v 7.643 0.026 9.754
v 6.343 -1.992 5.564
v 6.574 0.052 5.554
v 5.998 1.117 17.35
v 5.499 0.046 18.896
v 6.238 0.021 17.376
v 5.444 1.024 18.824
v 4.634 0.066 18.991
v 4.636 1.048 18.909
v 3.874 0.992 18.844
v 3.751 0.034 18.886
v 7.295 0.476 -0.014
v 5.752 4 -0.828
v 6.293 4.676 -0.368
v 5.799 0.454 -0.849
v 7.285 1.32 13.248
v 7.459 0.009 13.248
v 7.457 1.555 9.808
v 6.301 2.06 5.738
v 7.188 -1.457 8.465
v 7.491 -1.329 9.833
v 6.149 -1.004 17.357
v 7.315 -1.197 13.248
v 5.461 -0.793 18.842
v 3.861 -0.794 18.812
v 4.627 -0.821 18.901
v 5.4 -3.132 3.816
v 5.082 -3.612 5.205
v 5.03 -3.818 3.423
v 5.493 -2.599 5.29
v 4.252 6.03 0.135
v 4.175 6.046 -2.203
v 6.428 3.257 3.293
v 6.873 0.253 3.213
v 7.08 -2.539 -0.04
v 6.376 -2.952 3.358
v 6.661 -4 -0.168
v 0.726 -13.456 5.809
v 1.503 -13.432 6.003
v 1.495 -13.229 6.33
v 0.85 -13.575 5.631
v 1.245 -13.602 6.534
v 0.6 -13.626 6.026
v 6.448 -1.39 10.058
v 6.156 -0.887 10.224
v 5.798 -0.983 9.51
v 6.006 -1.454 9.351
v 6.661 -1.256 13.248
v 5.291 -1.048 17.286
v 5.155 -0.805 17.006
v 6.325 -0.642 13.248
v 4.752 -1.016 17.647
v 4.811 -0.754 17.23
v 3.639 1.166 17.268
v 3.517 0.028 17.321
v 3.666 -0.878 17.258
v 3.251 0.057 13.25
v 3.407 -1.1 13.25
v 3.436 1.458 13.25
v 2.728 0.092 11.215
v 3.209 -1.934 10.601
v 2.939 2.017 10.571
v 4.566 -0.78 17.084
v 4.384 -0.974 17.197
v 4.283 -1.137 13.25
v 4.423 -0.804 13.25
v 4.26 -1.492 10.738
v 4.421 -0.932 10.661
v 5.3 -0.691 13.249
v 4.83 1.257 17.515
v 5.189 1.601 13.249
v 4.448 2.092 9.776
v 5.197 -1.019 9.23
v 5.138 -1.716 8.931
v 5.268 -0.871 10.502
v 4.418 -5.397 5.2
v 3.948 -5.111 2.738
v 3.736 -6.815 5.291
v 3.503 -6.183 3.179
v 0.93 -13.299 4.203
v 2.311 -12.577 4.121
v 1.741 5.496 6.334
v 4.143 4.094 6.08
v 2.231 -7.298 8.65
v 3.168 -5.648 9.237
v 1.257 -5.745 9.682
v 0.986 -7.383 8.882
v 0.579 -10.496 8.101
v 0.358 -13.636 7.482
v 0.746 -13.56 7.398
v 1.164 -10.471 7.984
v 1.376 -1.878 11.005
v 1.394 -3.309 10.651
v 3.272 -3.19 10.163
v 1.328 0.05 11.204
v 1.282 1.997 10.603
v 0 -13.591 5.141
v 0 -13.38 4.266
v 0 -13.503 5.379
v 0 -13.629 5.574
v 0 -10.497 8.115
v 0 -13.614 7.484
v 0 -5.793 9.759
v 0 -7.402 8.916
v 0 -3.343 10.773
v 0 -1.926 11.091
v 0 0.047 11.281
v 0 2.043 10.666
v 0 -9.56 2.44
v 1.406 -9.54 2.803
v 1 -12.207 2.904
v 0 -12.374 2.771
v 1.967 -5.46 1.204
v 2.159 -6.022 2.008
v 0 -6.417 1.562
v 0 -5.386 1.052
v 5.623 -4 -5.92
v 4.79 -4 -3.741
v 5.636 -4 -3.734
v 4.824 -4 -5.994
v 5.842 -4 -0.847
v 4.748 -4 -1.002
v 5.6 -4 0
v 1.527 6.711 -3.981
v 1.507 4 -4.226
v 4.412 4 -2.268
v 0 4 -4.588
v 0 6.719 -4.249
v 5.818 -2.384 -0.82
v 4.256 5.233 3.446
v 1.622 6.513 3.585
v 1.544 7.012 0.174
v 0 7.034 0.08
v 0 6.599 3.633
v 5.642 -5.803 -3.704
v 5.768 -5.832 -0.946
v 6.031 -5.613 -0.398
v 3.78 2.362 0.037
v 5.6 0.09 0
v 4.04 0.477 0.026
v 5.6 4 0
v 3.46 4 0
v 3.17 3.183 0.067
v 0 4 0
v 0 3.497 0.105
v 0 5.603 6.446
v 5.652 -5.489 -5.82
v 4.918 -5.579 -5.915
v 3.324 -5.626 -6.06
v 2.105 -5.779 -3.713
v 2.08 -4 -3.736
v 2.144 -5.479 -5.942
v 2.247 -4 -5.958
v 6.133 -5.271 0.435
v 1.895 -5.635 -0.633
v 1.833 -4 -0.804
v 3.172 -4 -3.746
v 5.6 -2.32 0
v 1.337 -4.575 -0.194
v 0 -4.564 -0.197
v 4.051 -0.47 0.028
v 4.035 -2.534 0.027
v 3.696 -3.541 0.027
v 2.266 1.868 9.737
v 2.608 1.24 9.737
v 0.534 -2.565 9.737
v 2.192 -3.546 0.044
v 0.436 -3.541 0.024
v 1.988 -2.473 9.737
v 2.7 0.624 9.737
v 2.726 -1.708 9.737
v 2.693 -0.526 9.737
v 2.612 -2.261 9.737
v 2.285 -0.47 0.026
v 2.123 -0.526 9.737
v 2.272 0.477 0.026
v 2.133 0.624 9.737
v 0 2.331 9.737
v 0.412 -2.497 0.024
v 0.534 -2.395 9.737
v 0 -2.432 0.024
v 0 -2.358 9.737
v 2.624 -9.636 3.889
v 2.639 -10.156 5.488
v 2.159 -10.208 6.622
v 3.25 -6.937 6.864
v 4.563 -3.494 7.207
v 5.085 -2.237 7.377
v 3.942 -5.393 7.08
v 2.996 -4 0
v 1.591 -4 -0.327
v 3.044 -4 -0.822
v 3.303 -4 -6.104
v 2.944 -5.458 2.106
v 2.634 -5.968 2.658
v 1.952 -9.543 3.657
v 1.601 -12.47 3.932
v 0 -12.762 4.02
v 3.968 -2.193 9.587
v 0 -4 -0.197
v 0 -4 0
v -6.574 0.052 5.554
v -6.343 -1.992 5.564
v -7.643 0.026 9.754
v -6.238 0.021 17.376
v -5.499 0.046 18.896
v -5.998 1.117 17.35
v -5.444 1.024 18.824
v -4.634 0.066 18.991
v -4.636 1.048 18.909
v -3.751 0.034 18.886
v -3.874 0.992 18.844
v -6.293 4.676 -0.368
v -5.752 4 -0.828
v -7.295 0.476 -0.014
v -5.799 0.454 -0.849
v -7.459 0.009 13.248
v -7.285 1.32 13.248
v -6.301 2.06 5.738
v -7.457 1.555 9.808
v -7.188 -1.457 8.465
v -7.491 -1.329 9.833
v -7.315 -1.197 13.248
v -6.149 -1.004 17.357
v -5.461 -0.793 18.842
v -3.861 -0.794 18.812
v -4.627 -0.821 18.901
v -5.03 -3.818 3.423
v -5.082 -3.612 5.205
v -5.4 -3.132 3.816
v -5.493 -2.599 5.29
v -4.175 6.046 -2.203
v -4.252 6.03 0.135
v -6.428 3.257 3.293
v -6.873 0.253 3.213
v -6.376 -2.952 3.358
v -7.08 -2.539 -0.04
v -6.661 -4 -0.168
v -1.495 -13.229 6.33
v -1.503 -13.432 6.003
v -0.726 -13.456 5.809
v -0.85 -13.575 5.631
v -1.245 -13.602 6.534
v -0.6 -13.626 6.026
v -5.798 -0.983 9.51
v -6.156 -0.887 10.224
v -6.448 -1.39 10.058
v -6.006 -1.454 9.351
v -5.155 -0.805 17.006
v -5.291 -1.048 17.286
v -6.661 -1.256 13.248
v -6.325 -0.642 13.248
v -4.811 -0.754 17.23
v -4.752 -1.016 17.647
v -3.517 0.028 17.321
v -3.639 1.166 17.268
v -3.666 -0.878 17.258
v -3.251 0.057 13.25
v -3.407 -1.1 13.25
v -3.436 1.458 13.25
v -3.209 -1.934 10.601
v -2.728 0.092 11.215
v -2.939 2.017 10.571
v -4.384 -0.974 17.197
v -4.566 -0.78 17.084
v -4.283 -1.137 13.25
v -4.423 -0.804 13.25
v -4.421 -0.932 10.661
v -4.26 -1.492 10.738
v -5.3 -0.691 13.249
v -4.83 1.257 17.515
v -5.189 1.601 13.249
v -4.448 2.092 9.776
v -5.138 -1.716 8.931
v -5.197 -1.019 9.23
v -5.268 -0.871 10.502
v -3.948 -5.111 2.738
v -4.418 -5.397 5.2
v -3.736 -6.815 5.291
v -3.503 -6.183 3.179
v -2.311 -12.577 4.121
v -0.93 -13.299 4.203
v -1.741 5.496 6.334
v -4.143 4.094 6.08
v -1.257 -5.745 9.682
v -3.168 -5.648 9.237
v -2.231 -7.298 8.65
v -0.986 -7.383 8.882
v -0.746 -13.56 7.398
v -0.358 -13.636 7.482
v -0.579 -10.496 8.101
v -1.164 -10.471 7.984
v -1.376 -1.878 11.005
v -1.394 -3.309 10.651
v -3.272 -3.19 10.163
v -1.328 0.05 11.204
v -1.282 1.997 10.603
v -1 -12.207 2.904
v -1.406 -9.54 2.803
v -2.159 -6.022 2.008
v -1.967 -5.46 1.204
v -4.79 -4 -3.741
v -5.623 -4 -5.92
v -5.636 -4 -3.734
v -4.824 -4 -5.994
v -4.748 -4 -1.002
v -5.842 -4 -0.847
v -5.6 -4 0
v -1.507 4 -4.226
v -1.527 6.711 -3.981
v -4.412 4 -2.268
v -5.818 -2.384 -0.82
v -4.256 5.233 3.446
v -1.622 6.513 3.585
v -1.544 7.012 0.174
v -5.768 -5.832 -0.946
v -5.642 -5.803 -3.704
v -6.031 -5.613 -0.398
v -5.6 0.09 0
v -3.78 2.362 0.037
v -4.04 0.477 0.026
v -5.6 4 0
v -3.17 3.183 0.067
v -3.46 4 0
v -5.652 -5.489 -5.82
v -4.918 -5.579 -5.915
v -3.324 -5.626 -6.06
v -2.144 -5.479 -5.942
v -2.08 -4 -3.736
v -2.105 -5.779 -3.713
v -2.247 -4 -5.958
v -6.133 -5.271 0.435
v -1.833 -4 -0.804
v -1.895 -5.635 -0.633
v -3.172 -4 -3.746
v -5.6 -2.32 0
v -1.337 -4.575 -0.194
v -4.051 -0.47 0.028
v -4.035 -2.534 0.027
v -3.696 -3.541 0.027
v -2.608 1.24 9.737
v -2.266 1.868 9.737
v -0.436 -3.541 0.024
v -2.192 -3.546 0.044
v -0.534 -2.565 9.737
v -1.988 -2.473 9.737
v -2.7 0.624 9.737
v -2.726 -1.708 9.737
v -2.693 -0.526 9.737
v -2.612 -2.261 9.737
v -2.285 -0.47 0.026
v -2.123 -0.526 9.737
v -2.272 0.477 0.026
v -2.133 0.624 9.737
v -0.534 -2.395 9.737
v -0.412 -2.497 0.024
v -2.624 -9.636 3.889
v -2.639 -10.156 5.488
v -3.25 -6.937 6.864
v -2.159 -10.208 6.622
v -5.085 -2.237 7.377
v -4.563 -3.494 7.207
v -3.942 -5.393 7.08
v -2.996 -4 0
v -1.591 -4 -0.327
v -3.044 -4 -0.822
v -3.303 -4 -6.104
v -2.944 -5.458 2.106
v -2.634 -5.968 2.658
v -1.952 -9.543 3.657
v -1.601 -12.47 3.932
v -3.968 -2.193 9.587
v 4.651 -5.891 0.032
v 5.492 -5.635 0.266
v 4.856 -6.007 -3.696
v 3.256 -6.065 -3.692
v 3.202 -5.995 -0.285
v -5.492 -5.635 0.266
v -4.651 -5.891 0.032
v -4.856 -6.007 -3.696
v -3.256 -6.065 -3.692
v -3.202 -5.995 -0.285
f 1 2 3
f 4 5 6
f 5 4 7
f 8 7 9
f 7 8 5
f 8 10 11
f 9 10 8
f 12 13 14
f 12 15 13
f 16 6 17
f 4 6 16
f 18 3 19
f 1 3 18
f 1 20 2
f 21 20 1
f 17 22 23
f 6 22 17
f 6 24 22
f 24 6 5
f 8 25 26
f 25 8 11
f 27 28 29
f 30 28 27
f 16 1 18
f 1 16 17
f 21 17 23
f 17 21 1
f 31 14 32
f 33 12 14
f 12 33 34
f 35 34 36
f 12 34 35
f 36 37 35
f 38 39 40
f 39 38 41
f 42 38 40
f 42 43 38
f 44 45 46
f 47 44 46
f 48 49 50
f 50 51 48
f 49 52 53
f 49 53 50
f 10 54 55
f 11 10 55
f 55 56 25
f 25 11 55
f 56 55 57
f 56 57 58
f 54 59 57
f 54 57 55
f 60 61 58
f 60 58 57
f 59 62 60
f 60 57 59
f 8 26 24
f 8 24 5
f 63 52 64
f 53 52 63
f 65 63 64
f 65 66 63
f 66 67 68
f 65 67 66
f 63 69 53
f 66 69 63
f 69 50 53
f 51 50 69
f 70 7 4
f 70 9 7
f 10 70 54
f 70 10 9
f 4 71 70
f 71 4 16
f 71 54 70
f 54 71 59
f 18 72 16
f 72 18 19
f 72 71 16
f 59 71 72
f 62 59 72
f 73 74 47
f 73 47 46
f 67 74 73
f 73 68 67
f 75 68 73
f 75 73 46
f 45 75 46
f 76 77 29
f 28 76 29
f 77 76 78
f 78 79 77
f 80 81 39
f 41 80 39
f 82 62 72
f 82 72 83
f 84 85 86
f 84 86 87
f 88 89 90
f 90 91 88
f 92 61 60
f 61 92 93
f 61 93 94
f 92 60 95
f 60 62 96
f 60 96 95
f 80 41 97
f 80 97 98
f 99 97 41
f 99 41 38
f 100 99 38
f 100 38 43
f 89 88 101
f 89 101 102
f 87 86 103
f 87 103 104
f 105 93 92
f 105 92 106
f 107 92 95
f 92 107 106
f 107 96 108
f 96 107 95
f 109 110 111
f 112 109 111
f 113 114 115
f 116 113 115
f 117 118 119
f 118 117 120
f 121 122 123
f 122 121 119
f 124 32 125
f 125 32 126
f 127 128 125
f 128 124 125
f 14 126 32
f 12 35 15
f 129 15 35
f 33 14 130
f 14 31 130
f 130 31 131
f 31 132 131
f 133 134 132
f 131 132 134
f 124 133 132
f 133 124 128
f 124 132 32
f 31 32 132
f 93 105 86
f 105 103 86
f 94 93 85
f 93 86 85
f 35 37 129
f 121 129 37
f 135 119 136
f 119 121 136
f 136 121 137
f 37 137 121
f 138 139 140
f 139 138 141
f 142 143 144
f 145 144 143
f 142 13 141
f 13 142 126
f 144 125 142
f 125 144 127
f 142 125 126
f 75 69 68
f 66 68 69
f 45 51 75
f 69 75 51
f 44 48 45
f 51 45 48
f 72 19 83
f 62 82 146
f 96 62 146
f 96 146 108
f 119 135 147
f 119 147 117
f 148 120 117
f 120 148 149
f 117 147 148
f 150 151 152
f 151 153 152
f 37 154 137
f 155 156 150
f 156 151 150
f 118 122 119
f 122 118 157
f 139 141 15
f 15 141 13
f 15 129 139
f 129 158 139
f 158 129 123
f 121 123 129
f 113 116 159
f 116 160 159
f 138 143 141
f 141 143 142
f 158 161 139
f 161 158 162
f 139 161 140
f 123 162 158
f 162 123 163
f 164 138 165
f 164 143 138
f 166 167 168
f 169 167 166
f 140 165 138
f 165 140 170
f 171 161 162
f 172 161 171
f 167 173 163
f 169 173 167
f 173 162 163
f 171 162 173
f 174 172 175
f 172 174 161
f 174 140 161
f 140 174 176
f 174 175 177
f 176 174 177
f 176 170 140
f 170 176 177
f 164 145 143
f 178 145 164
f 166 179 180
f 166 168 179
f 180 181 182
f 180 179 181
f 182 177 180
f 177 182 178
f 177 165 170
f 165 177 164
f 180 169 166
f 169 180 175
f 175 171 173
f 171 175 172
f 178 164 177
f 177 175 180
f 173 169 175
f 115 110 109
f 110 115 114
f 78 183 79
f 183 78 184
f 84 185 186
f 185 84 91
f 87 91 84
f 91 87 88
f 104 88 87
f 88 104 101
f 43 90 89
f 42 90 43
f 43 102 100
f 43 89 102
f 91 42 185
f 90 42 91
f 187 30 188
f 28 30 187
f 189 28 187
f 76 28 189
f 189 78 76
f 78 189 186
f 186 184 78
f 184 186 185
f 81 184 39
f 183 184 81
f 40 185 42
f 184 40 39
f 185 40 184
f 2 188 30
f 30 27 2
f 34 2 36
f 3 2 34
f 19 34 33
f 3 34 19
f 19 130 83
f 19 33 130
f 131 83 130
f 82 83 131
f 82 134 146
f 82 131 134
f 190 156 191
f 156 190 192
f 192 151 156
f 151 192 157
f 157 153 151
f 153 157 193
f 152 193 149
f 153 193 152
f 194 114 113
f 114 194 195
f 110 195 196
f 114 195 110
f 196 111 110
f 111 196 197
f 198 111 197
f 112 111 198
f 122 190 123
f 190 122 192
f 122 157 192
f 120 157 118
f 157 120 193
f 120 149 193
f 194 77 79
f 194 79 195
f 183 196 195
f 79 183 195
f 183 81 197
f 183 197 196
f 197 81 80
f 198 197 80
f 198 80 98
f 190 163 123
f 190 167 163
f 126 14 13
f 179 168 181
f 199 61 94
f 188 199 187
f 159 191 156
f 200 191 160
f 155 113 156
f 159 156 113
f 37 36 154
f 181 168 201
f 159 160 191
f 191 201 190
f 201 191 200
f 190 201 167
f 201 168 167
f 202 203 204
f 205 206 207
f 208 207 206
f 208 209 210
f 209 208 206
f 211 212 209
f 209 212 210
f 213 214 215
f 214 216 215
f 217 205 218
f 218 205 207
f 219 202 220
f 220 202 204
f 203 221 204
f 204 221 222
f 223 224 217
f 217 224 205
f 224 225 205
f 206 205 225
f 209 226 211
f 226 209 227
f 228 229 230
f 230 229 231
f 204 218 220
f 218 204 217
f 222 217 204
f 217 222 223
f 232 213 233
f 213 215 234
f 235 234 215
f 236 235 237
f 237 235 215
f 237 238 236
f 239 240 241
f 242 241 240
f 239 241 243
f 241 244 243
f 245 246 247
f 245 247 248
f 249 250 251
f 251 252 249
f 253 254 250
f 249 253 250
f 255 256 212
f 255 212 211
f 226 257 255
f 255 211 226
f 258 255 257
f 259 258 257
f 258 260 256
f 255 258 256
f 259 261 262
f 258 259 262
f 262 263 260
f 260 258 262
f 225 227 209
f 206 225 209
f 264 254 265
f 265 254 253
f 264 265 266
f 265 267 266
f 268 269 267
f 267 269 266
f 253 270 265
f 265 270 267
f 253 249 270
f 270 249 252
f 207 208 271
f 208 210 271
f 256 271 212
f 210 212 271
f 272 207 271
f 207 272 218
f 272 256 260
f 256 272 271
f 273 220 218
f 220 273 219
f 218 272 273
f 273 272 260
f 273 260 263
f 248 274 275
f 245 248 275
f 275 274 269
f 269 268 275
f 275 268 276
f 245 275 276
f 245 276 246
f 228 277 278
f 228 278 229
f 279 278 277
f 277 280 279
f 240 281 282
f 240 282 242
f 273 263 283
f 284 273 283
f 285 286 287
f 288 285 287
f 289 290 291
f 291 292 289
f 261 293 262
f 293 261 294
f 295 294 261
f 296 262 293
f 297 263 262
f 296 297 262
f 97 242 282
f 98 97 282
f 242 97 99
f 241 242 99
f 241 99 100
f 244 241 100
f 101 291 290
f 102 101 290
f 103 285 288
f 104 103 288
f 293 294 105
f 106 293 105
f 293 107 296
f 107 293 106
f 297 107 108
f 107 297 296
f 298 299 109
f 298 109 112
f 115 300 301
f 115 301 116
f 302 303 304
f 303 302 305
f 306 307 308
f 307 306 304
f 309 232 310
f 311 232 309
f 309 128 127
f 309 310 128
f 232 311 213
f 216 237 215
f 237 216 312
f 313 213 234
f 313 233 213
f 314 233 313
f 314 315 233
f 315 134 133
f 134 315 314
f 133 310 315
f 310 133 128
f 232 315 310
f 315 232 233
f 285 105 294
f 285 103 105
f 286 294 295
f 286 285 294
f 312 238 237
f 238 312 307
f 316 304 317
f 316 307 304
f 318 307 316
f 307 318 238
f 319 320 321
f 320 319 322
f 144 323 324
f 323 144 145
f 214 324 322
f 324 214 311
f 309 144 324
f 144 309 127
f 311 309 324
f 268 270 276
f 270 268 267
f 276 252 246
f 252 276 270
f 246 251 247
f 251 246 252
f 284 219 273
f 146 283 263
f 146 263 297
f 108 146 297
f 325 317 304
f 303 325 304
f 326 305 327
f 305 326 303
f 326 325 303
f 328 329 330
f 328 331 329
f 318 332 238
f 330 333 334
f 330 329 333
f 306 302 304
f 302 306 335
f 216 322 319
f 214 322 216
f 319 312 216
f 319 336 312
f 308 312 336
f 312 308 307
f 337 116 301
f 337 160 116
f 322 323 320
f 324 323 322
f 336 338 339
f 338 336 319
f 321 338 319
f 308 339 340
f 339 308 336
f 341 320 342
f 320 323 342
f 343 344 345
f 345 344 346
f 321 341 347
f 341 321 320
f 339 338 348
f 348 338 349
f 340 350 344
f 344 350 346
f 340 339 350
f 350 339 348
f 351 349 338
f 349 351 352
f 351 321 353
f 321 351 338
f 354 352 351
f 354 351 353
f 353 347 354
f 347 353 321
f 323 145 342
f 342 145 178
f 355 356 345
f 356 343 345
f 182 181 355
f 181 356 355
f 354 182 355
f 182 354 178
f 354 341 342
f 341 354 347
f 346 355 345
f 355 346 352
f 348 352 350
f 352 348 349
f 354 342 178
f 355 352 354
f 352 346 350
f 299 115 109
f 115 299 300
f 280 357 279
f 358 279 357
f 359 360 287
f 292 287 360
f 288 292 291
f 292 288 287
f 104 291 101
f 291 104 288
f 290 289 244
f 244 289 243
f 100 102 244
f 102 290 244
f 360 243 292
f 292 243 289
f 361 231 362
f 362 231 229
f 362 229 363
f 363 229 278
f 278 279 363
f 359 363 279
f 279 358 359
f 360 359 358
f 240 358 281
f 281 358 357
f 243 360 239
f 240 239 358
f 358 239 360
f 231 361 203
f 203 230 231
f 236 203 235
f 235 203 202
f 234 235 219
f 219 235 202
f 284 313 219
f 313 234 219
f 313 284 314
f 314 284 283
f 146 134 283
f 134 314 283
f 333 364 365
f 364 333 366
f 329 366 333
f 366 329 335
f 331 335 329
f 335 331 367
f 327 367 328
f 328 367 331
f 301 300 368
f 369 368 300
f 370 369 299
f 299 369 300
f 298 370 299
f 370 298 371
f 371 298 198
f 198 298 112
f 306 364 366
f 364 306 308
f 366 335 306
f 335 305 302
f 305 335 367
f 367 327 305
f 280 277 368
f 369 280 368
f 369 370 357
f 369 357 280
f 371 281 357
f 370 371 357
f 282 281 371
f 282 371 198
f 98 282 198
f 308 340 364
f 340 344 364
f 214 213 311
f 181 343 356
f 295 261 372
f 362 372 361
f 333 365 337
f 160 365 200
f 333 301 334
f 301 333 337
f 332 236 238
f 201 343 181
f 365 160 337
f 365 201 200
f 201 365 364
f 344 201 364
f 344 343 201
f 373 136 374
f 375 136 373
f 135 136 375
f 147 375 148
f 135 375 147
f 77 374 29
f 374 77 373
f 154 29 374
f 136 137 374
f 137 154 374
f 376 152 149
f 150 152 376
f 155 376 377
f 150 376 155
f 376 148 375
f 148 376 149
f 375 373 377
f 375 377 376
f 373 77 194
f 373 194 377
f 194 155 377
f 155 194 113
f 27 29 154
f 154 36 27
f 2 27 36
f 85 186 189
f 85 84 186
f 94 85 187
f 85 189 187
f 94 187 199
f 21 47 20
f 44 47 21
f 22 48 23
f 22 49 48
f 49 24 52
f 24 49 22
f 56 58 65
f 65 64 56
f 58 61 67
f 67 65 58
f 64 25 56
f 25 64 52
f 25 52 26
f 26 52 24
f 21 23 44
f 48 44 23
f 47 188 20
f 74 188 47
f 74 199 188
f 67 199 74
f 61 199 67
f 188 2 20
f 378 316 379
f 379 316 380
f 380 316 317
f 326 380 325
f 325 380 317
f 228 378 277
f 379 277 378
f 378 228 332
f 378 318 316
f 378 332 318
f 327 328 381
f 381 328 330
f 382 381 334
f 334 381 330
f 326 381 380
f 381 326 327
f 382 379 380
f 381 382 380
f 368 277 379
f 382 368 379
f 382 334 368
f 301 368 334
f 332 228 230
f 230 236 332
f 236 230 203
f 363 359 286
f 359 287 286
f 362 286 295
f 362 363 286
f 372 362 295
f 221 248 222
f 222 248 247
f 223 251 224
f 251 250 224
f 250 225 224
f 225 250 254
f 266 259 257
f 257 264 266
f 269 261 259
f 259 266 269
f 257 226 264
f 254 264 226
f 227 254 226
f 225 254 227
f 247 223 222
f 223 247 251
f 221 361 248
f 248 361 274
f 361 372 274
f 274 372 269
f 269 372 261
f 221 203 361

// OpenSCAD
use <../lib.scad>
use <s/93248s01.scad>
use <s/93248s02.scad>
function ldraw_lib__93248() = [
// 0 Minifig Headdress Anubis Guard
// 0 Name: 93248.dat
// 0 Author: Stan Isachenko [angmarec]
// 0 !LDRAW_ORG Part UPDATE 2012-03
// 0 !LICENSE Licensed under CC BY 2.0 and CC BY 4.0 : see CAreadme.txt
// 
// 0 BFC CERTIFY CCW
  [0,"BFC","CERTIFY"],
  [0,"BFC","CCW"],
// 
// 0 !CATEGORY Minifig Headwear
// 0 !KEYWORDS Pharaoh's Quest
// 
// 0 !HISTORY 2011-10-16 {LEGO Digital Designer} Original part shape
// 0 !HISTORY 2011-10-17 [angmarec] File preparation for LDraw Parts Tracker
// 0 !HISTORY 2011-12-04 [MagFors] Subfiled for patterned parts
// 0 !HISTORY 2012-03-30 [PTadmin] Official Update 2012-01
// 0 !HISTORY 2012-12-24 [cwdee] Update category
// 0 !HISTORY 2012-12-28 [PTadmin] Official Update 2012-03
// 
// 
// 1 16 0 0 0 1 0 0 0 1 0 0 0 1 s\93248s01.dat
  [1,16,0,0,0,1,0,0,0,1,0,0,0,1, ldraw_lib__s__93248s01()],
// 1 16 0 0 0 -1 0 0 0 1 0 0 0 1 s\93248s01.dat
  [1,16,0,0,0,-1,0,0,0,1,0,0,0,1, ldraw_lib__s__93248s01()],
// 1 16 0 0 0 1 0 0 0 1 0 0 0 1 s\93248s02.dat
  [1,16,0,0,0,1,0,0,0,1,0,0,0,1, ldraw_lib__s__93248s02()],
// 1 16 0 0 0 -1 0 0 0 1 0 0 0 1 s\93248s02.dat
  [1,16,0,0,0,-1,0,0,0,1,0,0,0,1, ldraw_lib__s__93248s02()],
// 0 //
// 5 24 0 10.622 16.798 0 -0.199 17.586 3.817 9.953 16.778 -3.817 9.953 16.778
  [5,24,0,10.622,16.798,0,-0.199,17.586,3.817,9.953,16.778,-3.817,9.953,16.778],
// 5 24 0 11.469 10 0 10.622 16.798 3.767 10.565 10 -3.767 10.565 10
  [5,24,0,11.469,10,0,10.622,16.798,3.767,10.565,10,-3.767,10.565,10],
// 5 24 0 -10.666 -33.451 0 -10.049 -31.904 2.325 -10.508 -33.247 -2.325 -10.508 -33.247
  [5,24,0,-10.666,-33.451,0,-10.049,-31.904,2.325,-10.508,-33.247,-2.325,-10.508,-33.247],
// 5 24 0 -24.342 5.827 0 -0.263 8.742 5.664 -24.342 4.671 -5.664 -24.342 4.671
  [5,24,0,-24.342,5.827,0,-0.263,8.742,5.664,-24.342,4.671,-5.664,-24.342,4.671],
// 5 24 0 -20.288 -26.242 0 -18.711 -34.034 0.895 -18.705 -34.089 -0.895 -18.705 -34.089
  [5,24,0,-20.288,-26.242,0,-18.711,-34.034,0.895,-18.705,-34.089,-0.895,-18.705,-34.089],
// 5 24 0 -18.711 -34.034 0 -13.936 -34.072 1.5 -15.066 -34.066 -1.5 -15.066 -34.066
  [5,24,0,-18.711,-34.034,0,-13.936,-34.072,1.5,-15.066,-34.066,-1.5,-15.066,-34.066],
// 5 24 0 -13.936 -34.072 0 -13.447 -33.757 1.816 -14.523 -33.639 -1.816 -14.523 -33.639
  [5,24,0,-13.936,-34.072,0,-13.447,-33.757,1.816,-14.523,-33.639,-1.816,-14.523,-33.639],
// 5 24 0 -0.061 -6.079 0 -24.342 -5.894 1.334 -24.342 -5.988 -1.334 -24.342 -5.988
  [5,24,0,-0.061,-6.079,0,-24.342,-5.894,1.334,-24.342,-5.988,-1.334,-24.342,-5.988],
// 5 24 0 -16.114 14.008 0 -26.666 5.108 3.206 -26.507 4.993 -3.206 -26.507 4.993
  [5,24,0,-16.114,14.008,0,-26.666,5.108,3.206,-26.507,4.993,-3.206,-26.507,4.993],
// 5 24 0 -12.853 -33.977 0 -10.666 -33.451 2.325 -10.508 -33.247 -2.325 -10.508 -33.247
  [5,24,0,-12.853,-33.977,0,-10.666,-33.451,2.325,-10.508,-33.247,-2.325,-10.508,-33.247],
// 5 24 0 -13.447 -33.757 0 -12.853 -33.977 2.124 -14.078 -33.938 -2.124 -14.078 -33.938
  [5,24,0,-13.447,-33.757,0,-12.853,-33.977,2.124,-14.078,-33.938,-2.124,-14.078,-33.938],
// 5 24 0 -24.342 -5.894 0 -24.342 5.827 1.334 -24.342 -5.988 -1.334 -24.342 -5.988
  [5,24,0,-24.342,-5.894,0,-24.342,5.827,1.334,-24.342,-5.988,-1.334,-24.342,-5.988],
// 5 24 0 -3.904 -16.042 0 -2.629 -13.466 4.918 -3.009 -13.651 -4.918 -3.009 -13.651
  [5,24,0,-3.904,-16.042,0,-2.629,-13.466,4.918,-3.009,-13.651,-4.918,-3.009,-13.651],
// 5 24 0 0.492 -11.411 0 0.492 -10 3.978 0.817 -10 -3.978 0.817 -10
  [5,24,0,0.492,-11.411,0,0.492,-10,3.978,0.817,-10,-3.978,0.817,-10],
// 5 24 0 -26.666 5.108 0 -28.203 0.117 3.206 -26.507 4.993 -3.206 -26.507 4.993
  [5,24,0,-26.666,5.108,0,-28.203,0.117,3.206,-26.507,4.993,-3.206,-26.507,4.993],
// 5 24 0 -6.928 -30.935 0 -6.1 -23.899 2.501 -7.261 -30.517 -2.501 -7.261 -30.517
  [5,24,0,-6.928,-30.935,0,-6.1,-23.899,2.501,-7.261,-30.517,-2.501,-7.261,-30.517],
// 5 24 0 -28.203 0.117 0 -27.727 -4.816 3.319 -28.01 0.124 -3.319 -28.01 0.124
  [5,24,0,-28.203,0.117,0,-27.727,-4.816,3.319,-28.01,0.124,-3.319,-28.01,0.124],
// 5 24 0 -9.083 16.497 0 -16.114 14.008 4.353 -15.835 13.739 -4.353 -15.835 13.739
  [5,24,0,-9.083,16.497,0,-16.114,14.008,4.353,-15.835,13.739,-4.353,-15.835,13.739],
// 5 24 0 0 10 0 11.469 10 3.767 10.565 10 -3.767 10.565 10
  [5,24,0,0,10,0,11.469,10,3.767,10.565,10,-3.767,10.565,10],
// 5 24 0 -26.932 -8.358 0 -24.398 -14.482 3.143 -24.205 -14.363 -3.143 -24.205 -14.363
  [5,24,0,-26.932,-8.358,0,-24.398,-14.482,3.143,-24.205,-14.363,-3.143,-24.205,-14.363],
// 5 24 0 -0.199 17.586 0 -9.083 16.497 3.86 -0.435 17.529 -3.86 -0.435 17.529
  [5,24,0,-0.199,17.586,0,-9.083,16.497,3.86,-0.435,17.529,-3.86,-0.435,17.529],
// 5 24 0 -24.398 -14.482 0 -22.289 -18.504 2.466 -22.205 -18.457 -2.466 -22.205 -18.457
  [5,24,0,-24.398,-14.482,0,-22.289,-18.504,2.466,-22.205,-18.457,-2.466,-22.205,-18.457],
// 5 24 0 -6.1 -23.899 0 -3.904 -16.042 3.515 -7.008 -23.85 -3.515 -7.008 -23.85
  [5,24,0,-6.1,-23.899,0,-3.904,-16.042,3.515,-7.008,-23.85,-3.515,-7.008,-23.85],
// 5 24 0 -2.629 -13.466 0 0.492 -11.411 3.342 0.486 -11.437 -3.342 0.486 -11.437
  [5,24,0,-2.629,-13.466,0,0.492,-11.411,3.342,0.486,-11.437,-3.342,0.486,-11.437],
// 5 24 0 -0.263 8.742 0 0 10 7.926 -0.167 7.958 -7.926 -0.167 7.958
  [5,24,0,-0.263,8.742,0,0,10,7.926,-0.167,7.958,-7.926,-0.167,7.958],
// 5 24 0 -27.727 -4.816 0 -26.932 -8.358 3.441 -27.512 -4.695 -3.441 -27.512 -4.695
  [5,24,0,-27.727,-4.816,0,-26.932,-8.358,3.441,-27.512,-4.695,-3.441,-27.512,-4.695],
// 5 24 0 -22.289 -18.504 0 -20.288 -26.242 1.447 -20.252 -26.24 -1.447 -20.252 -26.24
  [5,24,0,-22.289,-18.504,0,-20.288,-26.242,1.447,-20.252,-26.24,-1.447,-20.252,-26.24],
// 5 24 0 -10.049 -31.904 0 -6.928 -30.935 2.501 -7.261 -30.517 -2.501 -7.261 -30.517
  [5,24,0,-10.049,-31.904,0,-6.928,-30.935,2.501,-7.261,-30.517,-2.501,-7.261,-30.517],
// 
// 5 24 0 -22.289 -18.504 0 -20.288 -26.242 1.447 -20.252 -26.24 -2.466 -22.205 -18.457
  [5,24,0,-22.289,-18.504,0,-20.288,-26.242,1.447,-20.252,-26.24,-2.466,-22.205,-18.457],
// 5 24 0 0 -10 0 -0.061 -6.079 1.091 -0.061 -8.853 -1.091 -0.061 -8.853
  [5,24,0,0,-10,0,-0.061,-6.079,1.091,-0.061,-8.853,-1.091,-0.061,-8.853],
];
module ldraw_lib__93248(step=0, col=false, unit=2/5, alt=false, line=0.2, solid=!$preview)
    makepoly(ldraw_lib__93248(), step=step, col=col, unit=unit, alt=alt, line=line, solid=solid);
ldraw_lib__93248(line=0.2);
